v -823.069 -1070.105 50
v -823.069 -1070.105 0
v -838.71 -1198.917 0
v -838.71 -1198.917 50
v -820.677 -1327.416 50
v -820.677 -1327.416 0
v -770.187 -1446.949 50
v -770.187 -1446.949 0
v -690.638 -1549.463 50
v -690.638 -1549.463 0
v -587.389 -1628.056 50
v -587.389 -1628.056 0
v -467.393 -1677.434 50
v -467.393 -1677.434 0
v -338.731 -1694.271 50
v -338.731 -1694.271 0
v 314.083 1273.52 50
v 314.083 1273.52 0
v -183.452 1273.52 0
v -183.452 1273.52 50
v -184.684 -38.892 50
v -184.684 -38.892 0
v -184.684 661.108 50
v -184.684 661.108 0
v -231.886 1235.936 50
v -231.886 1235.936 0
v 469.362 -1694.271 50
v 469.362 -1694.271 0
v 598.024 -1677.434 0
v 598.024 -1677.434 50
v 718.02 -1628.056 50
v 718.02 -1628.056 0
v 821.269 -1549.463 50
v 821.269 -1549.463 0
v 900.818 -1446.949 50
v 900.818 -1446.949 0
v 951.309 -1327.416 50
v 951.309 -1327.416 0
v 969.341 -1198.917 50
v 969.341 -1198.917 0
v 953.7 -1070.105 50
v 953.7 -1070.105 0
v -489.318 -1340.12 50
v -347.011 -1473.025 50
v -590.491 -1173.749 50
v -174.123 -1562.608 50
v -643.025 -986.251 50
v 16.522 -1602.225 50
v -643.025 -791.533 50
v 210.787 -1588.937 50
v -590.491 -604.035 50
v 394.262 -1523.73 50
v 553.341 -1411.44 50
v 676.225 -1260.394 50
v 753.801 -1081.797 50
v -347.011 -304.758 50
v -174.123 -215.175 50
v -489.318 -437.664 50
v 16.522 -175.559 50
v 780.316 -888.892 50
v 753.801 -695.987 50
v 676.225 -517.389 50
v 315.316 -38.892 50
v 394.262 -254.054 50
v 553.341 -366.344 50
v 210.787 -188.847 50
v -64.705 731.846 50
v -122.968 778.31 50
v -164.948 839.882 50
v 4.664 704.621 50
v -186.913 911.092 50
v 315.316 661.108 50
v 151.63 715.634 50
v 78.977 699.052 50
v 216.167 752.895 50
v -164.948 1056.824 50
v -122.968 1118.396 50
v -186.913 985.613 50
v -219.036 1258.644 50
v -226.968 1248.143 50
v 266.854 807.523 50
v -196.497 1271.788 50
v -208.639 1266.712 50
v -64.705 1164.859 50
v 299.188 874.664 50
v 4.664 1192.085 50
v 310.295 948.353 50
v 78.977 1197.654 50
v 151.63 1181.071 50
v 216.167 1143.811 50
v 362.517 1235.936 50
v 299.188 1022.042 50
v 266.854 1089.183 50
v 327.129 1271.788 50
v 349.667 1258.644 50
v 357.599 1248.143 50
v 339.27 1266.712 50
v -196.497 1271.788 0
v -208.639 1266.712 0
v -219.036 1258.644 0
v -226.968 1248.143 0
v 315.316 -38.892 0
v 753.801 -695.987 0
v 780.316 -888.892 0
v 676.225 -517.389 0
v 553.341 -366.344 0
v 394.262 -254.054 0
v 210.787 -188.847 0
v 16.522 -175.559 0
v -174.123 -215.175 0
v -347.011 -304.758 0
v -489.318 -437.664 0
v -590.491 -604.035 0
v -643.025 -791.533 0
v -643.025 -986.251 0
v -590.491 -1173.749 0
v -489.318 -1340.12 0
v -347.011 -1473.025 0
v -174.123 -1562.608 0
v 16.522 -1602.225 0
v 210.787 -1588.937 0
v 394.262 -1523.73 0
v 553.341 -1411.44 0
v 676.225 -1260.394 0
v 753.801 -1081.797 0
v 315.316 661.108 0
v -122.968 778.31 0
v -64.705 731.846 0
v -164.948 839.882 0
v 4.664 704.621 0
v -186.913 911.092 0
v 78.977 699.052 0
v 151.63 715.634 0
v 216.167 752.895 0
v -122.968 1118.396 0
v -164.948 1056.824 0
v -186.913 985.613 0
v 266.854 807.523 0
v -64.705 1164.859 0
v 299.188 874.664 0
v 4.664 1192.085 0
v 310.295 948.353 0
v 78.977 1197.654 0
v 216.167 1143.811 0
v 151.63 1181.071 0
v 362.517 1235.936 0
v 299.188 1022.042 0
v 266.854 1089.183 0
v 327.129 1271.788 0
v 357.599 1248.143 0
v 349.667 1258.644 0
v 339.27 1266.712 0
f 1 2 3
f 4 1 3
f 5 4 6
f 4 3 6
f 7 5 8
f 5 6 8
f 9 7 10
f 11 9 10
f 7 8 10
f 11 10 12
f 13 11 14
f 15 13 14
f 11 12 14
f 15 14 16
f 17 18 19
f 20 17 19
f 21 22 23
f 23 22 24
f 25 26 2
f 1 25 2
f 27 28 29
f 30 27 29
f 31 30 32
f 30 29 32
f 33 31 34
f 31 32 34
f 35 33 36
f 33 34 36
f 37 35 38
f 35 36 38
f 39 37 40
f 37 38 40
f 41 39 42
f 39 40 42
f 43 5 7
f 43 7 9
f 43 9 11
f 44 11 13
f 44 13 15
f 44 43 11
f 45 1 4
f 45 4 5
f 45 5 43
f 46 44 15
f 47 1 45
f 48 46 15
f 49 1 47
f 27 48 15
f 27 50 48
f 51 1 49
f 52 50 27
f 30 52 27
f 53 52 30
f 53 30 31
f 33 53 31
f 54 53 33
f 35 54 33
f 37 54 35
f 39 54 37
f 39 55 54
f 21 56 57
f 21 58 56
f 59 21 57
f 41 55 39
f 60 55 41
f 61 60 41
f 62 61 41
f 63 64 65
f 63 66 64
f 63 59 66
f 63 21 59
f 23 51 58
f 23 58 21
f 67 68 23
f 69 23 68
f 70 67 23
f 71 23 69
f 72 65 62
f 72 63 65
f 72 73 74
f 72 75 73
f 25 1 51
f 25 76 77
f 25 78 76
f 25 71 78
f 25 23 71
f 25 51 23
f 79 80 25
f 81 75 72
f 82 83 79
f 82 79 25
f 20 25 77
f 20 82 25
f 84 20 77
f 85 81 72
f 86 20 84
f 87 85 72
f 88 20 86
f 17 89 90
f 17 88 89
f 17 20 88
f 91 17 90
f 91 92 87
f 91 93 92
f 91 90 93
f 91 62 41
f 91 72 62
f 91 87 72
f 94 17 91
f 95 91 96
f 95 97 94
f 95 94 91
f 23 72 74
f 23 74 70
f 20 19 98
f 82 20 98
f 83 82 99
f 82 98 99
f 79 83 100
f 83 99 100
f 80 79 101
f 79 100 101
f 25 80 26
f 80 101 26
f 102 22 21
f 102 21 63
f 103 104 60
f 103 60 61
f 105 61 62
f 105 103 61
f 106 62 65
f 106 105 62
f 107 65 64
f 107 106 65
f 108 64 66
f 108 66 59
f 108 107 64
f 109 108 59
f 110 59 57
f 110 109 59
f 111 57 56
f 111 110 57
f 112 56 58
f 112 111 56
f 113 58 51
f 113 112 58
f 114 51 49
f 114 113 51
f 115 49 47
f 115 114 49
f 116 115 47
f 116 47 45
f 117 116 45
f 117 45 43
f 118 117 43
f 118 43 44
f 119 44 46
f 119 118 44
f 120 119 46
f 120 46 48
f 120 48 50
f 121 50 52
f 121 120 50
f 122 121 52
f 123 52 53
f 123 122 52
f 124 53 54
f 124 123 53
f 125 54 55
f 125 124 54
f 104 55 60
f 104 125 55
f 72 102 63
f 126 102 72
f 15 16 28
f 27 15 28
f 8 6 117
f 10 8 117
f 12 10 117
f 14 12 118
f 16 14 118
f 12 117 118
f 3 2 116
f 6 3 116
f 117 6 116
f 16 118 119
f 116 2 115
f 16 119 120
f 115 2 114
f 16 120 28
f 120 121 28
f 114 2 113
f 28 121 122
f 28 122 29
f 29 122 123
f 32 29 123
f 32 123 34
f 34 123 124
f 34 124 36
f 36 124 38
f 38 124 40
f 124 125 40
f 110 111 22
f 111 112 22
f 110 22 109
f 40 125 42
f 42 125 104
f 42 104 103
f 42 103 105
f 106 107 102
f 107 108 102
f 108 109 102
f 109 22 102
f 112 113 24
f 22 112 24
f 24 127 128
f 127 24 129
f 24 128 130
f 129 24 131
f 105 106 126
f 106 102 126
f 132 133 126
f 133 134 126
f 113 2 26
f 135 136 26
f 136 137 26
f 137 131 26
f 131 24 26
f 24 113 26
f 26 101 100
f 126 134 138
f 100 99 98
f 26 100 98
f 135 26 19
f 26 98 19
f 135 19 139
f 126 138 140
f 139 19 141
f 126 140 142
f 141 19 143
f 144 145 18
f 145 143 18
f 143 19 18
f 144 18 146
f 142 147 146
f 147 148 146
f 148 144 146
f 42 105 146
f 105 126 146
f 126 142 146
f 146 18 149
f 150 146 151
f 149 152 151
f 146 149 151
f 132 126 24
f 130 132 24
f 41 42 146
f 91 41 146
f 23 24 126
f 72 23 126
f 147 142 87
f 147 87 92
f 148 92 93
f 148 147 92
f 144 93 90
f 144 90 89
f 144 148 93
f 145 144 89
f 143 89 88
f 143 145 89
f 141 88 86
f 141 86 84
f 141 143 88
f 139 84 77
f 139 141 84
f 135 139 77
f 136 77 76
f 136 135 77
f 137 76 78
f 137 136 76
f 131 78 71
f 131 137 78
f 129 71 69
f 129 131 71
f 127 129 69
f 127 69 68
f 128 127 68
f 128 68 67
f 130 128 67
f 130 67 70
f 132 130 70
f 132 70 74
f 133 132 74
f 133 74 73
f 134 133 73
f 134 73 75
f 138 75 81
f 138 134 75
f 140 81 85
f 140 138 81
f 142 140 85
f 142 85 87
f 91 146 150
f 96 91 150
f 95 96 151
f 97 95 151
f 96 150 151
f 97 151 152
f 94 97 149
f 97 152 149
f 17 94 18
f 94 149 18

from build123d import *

# Parameters (mm, degrees)
SKETCH3_R           = 250
SKETCH3_R_2         = 715
SKETCH3_W           = 500
SKETCH3_H           = 700
BOSS_EXTRUDE1_DEPTH = 50


with BuildPart() as part:
    # Sketch3 → Boss-Extrude1 (new body)
    with BuildSketch(Plane.XY):
        with BuildLine():
            Line((953.699706136, -1070.104718306), (362.516639902, 1235.936167947))
            ThreePointArc((362.516639902, 1235.936167947), (344.735540122, 1263.021649549), (314.082893486, 1273.519557779))
            Line((314.082893486, 1273.519557779), (-183.451796134, 1273.519557779))
            ThreePointArc((-183.451796134, 1273.519557779), (-214.10444277, 1263.021649549), (-231.885542551, 1235.936167947))
            Line((-231.885542551, 1235.936167947), (-823.068608784, -1070.104718306))
            ThreePointArc((-823.068608784, -1070.104718306), (-733.752062318, -1500.797286347), (-338.731144619, -1694.270819985))
            Line((-338.731144619, -1694.270819985), (469.362241971, -1694.270819985))
            ThreePointArc((469.362241971, -1694.270819985), (864.383159669, -1500.797286347), (953.699706136, -1070.104718306))
        make_face()
        with Locations((60.29466546, 948.352728731)):
            Circle(SKETCH3_R, mode=Mode.SUBTRACT)
        with Locations((65.315548676, -888.891859179)):
            Circle(SKETCH3_R_2, mode=Mode.SUBTRACT)
        with Locations((65.315548676, 311.108140821)):
            Rectangle(SKETCH3_W, SKETCH3_H, mode=Mode.SUBTRACT)
    extrude(amount=BOSS_EXTRUDE1_DEPTH)


solid = part.part
